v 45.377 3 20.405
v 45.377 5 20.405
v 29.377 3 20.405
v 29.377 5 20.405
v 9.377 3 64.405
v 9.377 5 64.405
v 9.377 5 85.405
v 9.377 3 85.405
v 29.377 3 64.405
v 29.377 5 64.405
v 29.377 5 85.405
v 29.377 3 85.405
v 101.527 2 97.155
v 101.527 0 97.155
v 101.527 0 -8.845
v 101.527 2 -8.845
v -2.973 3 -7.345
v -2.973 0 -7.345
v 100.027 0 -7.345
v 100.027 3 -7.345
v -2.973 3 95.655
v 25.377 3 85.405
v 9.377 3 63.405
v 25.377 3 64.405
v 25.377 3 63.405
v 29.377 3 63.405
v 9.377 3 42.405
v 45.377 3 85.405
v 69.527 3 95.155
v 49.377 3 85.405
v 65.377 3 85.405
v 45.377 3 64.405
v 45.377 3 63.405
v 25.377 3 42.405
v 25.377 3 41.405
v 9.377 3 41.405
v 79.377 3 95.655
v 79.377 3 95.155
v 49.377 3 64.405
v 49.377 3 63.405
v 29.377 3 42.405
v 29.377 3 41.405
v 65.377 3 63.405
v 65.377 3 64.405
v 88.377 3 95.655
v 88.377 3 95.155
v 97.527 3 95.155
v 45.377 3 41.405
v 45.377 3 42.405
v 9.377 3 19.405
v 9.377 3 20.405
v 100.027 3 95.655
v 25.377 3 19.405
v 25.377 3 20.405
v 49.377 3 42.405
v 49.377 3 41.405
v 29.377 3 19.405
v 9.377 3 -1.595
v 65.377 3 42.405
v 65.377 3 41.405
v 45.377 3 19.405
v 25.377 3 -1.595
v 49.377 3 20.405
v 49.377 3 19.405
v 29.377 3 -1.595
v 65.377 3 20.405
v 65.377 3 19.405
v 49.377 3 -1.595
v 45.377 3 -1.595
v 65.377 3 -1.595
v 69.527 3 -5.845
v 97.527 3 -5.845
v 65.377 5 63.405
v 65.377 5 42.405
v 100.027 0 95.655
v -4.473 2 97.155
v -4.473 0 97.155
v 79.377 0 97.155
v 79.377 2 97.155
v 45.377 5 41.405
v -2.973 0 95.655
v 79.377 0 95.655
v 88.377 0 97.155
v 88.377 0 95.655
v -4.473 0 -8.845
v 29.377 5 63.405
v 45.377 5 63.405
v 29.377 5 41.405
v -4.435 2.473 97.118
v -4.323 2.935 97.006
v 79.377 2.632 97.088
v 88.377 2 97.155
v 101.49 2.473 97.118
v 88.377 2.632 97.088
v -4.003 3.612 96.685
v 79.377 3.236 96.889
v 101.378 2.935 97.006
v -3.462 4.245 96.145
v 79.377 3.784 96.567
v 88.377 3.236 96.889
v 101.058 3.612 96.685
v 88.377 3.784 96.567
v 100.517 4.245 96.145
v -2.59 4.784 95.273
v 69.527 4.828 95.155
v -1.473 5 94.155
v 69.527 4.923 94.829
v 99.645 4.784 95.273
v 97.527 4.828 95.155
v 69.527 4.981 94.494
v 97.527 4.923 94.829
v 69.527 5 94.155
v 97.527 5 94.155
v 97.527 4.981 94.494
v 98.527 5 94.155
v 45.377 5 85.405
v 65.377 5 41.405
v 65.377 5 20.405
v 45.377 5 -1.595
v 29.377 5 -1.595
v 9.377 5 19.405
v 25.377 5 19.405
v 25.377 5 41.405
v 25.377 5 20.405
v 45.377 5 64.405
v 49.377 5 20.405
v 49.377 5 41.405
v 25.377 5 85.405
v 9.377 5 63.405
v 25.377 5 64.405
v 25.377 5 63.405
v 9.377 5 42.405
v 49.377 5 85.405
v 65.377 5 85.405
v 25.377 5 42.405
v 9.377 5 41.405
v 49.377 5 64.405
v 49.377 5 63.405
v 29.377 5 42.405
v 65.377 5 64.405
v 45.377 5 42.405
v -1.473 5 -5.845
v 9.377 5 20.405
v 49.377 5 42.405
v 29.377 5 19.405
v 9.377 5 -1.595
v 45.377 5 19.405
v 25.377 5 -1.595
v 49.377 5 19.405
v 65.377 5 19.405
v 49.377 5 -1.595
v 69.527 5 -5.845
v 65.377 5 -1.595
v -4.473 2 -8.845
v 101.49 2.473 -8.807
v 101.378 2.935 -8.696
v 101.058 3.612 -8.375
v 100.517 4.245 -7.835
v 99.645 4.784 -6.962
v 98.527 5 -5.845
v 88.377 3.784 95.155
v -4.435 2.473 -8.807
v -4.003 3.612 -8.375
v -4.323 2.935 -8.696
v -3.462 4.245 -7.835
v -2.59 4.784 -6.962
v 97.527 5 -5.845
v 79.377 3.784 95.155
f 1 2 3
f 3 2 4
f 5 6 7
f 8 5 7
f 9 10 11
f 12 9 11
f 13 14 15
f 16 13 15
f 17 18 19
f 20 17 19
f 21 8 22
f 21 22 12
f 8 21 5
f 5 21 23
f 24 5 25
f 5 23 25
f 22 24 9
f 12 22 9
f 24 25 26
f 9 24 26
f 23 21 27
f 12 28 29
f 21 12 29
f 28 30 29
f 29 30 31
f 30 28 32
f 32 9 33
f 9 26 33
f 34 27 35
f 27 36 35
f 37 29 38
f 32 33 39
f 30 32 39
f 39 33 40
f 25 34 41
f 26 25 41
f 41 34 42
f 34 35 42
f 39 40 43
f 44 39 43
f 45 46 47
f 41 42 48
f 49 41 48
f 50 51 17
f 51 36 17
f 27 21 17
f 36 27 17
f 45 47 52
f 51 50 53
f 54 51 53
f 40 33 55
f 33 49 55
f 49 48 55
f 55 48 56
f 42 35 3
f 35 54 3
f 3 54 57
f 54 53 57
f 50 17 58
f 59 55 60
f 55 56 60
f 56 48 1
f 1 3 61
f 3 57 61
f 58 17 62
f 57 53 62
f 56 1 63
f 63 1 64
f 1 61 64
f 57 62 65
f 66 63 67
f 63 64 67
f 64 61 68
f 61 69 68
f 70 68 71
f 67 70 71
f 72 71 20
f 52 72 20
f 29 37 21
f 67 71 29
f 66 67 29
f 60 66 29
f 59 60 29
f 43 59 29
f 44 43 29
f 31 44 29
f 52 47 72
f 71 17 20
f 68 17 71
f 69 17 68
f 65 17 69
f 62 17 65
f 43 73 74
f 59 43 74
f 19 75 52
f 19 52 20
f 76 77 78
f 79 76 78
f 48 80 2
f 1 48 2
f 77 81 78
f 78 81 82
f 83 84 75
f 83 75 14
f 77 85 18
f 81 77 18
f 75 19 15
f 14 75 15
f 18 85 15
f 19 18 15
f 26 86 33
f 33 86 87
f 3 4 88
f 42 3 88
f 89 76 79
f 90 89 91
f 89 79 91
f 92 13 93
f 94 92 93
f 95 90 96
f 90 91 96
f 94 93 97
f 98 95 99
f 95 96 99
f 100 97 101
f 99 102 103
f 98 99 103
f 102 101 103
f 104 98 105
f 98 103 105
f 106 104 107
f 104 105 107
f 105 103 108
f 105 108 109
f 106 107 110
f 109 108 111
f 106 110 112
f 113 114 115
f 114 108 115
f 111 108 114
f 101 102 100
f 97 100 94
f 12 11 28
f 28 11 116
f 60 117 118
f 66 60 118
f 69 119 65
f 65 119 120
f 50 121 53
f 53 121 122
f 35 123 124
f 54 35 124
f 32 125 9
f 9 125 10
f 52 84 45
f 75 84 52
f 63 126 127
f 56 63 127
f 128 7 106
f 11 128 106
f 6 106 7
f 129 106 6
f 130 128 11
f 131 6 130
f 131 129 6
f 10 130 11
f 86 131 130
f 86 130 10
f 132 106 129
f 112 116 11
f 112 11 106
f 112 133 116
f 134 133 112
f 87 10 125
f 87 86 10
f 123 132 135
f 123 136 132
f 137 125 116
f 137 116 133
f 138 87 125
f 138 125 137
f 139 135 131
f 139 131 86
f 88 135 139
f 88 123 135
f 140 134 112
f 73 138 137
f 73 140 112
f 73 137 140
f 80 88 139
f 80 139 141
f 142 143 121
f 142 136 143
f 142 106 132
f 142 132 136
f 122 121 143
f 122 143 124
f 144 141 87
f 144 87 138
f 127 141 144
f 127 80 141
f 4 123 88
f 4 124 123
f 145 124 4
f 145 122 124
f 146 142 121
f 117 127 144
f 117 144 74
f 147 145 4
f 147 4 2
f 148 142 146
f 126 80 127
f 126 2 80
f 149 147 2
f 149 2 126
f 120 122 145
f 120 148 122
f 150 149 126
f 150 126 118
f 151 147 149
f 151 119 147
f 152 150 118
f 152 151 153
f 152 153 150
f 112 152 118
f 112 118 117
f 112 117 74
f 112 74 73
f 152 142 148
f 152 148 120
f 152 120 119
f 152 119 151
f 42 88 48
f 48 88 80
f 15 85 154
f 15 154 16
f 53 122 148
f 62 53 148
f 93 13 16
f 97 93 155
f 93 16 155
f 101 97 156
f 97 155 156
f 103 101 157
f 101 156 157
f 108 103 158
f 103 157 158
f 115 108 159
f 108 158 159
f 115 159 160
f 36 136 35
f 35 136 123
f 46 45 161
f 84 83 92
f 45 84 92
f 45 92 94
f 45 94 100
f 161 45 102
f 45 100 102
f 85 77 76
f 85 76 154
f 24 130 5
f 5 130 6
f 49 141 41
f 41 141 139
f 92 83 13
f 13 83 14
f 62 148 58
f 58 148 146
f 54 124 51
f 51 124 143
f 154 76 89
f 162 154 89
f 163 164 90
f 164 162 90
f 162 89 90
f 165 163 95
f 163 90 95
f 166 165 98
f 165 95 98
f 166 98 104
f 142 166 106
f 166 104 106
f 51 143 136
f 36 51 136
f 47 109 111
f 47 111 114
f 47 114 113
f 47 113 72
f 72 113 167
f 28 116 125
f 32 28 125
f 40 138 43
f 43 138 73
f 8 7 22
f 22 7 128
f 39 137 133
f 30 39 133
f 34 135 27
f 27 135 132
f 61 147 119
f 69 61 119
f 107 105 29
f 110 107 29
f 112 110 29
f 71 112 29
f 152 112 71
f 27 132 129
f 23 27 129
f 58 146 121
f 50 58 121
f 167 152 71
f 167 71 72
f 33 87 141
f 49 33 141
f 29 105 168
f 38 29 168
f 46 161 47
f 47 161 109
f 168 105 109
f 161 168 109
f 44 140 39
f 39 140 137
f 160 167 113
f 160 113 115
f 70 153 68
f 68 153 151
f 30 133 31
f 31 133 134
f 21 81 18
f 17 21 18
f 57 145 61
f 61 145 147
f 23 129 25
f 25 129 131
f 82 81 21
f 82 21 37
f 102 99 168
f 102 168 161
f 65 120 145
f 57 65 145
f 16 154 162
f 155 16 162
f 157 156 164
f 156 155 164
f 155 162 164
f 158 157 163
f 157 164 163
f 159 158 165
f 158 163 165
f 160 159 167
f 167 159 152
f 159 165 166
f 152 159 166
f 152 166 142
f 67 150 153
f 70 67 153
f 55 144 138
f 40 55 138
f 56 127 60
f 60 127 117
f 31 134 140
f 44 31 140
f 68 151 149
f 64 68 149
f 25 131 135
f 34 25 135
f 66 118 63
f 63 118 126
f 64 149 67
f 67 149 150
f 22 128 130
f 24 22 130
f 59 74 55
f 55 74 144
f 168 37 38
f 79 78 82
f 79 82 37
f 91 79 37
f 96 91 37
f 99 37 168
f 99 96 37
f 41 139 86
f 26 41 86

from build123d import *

# Parameters (mm, degrees)
SKETCH2_W            = 106
SKETCH2_H            = 106
BOSS_EXTRUDE3_DEPTH  = 5
SKETCH3_W            = 103
SKETCH3_H            = 103
CUT_EXTRUDE1_DEPTH   = 3
SKETCH4_W            = 9
SKETCH4_H            = 3.784346923
CUT_EXTRUDE2_DEPTH   = 10
FILLET1_R            = 3
SKETCH5_W            = 28
SKETCH5_H            = 101
CUT_EXTRUDE3_DEPTH   = 10
CUT_EXTRUDE5_DEPTH   = 2
LPATTERN1_COUNT      = 4
LPATTERN1_PITCH      = 22
LPATTERN1_COUNT_DIR2 = 3
LPATTERN1_PITCH_DIR2 = 20


with BuildPart() as part:
    # Sketch2 → Boss-Extrude3 (new body)
    with BuildSketch(Plane(origin=(0, 0, 0), x_dir=(1, 0, 0), z_dir=(0, 1, 0))):
        with Locations((48.527443435, -44.155148704)):
            Rectangle(SKETCH2_W, SKETCH2_H)
    extrude(amount=BOSS_EXTRUDE3_DEPTH)

    # Sketch3 → Cut-Extrude1 (cut)
    with BuildSketch(Plane(origin=(0, 0, 0), x_dir=(1, 0, 0), z_dir=(0, 1, 0))):
        with Locations((48.527443435, -44.155148704)):
            Rectangle(SKETCH3_W, SKETCH3_H)
    extrude(amount=CUT_EXTRUDE1_DEPTH, mode=Mode.SUBTRACT)

    # Sketch4 → Cut-Extrude2 (cut)
    with BuildSketch(Plane.XY.offset(97.155148704)):
        with Locations((83.877443435, 1.892173462)):
            Rectangle(SKETCH4_W, SKETCH4_H)
    extrude(amount=-CUT_EXTRUDE2_DEPTH, mode=Mode.SUBTRACT)

    # Fillet1
    # the kernel refuses this fillet: 3 mm, written as the material it takes off along each edge
    with BuildSketch(Plane(origin=(101.527443435, 5, -16.344851296), x_dir=(0, -1, 0), z_dir=(0, 0, 1)), Plane(origin=(-11.972556565, 5, -8.844851296), x_dir=(0, -1, 0), z_dir=(1, 0, 0)), Plane(origin=(-4.472556565, 5, 104.655148704), x_dir=(0, -1, 0), z_dir=(0, 0, -1))) as fillet1_piece_1:
        with BuildLine():
            CenterArc((FILLET1_R, -FILLET1_R), FILLET1_R, 90, 90)
            Line((0, -FILLET1_R), (0, 0))
            Line((0, 0), (FILLET1_R, 0))
        make_face()
    extrude(amount=121, mode=Mode.SUBTRACT)
    with BuildSketch(Plane(origin=(109.027443435, 5, 97.155148704), x_dir=(0, 0, -1), z_dir=(-1, 0, 0))) as fillet1_piece_2:
        with BuildLine():
            CenterArc((FILLET1_R, FILLET1_R), FILLET1_R, 180, 90)
            Line((0, FILLET1_R), (0, 0))
            Line((0, 0), (FILLET1_R, 0))
        make_face()
    extrude(amount=121, mode=Mode.SUBTRACT)

    # Sketch5 → Cut-Extrude3 (cut)
    with BuildSketch(Plane(origin=(0, 5, 0), x_dir=(1, 0, 0), z_dir=(0, 1, 0))):
        with Locations((83.527443435, -44.655148704)):
            Rectangle(SKETCH5_W, SKETCH5_H)
    extrude(amount=-CUT_EXTRUDE3_DEPTH, mode=Mode.SUBTRACT)

    # Sketch6 → Cut-Extrude5 (cut)
    with BuildSketch(Plane(origin=(0, 5, 0), x_dir=(1, 0, 0), z_dir=(0, 1, 0))):
        Polygon((49.377443435, -69.405148704), (49.377443435, -85.405148704), (65.377443435, -85.405148704), (65.377443435, -69.405148704), (65.377443435, -64.405148704), (49.377443435, -64.405148704), align=None)
    cut_extrude5 = extrude(amount=-CUT_EXTRUDE5_DEPTH, mode=Mode.SUBTRACT)

    # LPattern1: Cut-Extrude5 4 × 3
    with Locations(*[(-j * LPATTERN1_PITCH_DIR2, 0, -i * LPATTERN1_PITCH) for i in range(LPATTERN1_COUNT) for j in range(LPATTERN1_COUNT_DIR2) if (i, j) != (0, 0)]):
        add(cut_extrude5, mode=Mode.SUBTRACT)


solid = part.part
